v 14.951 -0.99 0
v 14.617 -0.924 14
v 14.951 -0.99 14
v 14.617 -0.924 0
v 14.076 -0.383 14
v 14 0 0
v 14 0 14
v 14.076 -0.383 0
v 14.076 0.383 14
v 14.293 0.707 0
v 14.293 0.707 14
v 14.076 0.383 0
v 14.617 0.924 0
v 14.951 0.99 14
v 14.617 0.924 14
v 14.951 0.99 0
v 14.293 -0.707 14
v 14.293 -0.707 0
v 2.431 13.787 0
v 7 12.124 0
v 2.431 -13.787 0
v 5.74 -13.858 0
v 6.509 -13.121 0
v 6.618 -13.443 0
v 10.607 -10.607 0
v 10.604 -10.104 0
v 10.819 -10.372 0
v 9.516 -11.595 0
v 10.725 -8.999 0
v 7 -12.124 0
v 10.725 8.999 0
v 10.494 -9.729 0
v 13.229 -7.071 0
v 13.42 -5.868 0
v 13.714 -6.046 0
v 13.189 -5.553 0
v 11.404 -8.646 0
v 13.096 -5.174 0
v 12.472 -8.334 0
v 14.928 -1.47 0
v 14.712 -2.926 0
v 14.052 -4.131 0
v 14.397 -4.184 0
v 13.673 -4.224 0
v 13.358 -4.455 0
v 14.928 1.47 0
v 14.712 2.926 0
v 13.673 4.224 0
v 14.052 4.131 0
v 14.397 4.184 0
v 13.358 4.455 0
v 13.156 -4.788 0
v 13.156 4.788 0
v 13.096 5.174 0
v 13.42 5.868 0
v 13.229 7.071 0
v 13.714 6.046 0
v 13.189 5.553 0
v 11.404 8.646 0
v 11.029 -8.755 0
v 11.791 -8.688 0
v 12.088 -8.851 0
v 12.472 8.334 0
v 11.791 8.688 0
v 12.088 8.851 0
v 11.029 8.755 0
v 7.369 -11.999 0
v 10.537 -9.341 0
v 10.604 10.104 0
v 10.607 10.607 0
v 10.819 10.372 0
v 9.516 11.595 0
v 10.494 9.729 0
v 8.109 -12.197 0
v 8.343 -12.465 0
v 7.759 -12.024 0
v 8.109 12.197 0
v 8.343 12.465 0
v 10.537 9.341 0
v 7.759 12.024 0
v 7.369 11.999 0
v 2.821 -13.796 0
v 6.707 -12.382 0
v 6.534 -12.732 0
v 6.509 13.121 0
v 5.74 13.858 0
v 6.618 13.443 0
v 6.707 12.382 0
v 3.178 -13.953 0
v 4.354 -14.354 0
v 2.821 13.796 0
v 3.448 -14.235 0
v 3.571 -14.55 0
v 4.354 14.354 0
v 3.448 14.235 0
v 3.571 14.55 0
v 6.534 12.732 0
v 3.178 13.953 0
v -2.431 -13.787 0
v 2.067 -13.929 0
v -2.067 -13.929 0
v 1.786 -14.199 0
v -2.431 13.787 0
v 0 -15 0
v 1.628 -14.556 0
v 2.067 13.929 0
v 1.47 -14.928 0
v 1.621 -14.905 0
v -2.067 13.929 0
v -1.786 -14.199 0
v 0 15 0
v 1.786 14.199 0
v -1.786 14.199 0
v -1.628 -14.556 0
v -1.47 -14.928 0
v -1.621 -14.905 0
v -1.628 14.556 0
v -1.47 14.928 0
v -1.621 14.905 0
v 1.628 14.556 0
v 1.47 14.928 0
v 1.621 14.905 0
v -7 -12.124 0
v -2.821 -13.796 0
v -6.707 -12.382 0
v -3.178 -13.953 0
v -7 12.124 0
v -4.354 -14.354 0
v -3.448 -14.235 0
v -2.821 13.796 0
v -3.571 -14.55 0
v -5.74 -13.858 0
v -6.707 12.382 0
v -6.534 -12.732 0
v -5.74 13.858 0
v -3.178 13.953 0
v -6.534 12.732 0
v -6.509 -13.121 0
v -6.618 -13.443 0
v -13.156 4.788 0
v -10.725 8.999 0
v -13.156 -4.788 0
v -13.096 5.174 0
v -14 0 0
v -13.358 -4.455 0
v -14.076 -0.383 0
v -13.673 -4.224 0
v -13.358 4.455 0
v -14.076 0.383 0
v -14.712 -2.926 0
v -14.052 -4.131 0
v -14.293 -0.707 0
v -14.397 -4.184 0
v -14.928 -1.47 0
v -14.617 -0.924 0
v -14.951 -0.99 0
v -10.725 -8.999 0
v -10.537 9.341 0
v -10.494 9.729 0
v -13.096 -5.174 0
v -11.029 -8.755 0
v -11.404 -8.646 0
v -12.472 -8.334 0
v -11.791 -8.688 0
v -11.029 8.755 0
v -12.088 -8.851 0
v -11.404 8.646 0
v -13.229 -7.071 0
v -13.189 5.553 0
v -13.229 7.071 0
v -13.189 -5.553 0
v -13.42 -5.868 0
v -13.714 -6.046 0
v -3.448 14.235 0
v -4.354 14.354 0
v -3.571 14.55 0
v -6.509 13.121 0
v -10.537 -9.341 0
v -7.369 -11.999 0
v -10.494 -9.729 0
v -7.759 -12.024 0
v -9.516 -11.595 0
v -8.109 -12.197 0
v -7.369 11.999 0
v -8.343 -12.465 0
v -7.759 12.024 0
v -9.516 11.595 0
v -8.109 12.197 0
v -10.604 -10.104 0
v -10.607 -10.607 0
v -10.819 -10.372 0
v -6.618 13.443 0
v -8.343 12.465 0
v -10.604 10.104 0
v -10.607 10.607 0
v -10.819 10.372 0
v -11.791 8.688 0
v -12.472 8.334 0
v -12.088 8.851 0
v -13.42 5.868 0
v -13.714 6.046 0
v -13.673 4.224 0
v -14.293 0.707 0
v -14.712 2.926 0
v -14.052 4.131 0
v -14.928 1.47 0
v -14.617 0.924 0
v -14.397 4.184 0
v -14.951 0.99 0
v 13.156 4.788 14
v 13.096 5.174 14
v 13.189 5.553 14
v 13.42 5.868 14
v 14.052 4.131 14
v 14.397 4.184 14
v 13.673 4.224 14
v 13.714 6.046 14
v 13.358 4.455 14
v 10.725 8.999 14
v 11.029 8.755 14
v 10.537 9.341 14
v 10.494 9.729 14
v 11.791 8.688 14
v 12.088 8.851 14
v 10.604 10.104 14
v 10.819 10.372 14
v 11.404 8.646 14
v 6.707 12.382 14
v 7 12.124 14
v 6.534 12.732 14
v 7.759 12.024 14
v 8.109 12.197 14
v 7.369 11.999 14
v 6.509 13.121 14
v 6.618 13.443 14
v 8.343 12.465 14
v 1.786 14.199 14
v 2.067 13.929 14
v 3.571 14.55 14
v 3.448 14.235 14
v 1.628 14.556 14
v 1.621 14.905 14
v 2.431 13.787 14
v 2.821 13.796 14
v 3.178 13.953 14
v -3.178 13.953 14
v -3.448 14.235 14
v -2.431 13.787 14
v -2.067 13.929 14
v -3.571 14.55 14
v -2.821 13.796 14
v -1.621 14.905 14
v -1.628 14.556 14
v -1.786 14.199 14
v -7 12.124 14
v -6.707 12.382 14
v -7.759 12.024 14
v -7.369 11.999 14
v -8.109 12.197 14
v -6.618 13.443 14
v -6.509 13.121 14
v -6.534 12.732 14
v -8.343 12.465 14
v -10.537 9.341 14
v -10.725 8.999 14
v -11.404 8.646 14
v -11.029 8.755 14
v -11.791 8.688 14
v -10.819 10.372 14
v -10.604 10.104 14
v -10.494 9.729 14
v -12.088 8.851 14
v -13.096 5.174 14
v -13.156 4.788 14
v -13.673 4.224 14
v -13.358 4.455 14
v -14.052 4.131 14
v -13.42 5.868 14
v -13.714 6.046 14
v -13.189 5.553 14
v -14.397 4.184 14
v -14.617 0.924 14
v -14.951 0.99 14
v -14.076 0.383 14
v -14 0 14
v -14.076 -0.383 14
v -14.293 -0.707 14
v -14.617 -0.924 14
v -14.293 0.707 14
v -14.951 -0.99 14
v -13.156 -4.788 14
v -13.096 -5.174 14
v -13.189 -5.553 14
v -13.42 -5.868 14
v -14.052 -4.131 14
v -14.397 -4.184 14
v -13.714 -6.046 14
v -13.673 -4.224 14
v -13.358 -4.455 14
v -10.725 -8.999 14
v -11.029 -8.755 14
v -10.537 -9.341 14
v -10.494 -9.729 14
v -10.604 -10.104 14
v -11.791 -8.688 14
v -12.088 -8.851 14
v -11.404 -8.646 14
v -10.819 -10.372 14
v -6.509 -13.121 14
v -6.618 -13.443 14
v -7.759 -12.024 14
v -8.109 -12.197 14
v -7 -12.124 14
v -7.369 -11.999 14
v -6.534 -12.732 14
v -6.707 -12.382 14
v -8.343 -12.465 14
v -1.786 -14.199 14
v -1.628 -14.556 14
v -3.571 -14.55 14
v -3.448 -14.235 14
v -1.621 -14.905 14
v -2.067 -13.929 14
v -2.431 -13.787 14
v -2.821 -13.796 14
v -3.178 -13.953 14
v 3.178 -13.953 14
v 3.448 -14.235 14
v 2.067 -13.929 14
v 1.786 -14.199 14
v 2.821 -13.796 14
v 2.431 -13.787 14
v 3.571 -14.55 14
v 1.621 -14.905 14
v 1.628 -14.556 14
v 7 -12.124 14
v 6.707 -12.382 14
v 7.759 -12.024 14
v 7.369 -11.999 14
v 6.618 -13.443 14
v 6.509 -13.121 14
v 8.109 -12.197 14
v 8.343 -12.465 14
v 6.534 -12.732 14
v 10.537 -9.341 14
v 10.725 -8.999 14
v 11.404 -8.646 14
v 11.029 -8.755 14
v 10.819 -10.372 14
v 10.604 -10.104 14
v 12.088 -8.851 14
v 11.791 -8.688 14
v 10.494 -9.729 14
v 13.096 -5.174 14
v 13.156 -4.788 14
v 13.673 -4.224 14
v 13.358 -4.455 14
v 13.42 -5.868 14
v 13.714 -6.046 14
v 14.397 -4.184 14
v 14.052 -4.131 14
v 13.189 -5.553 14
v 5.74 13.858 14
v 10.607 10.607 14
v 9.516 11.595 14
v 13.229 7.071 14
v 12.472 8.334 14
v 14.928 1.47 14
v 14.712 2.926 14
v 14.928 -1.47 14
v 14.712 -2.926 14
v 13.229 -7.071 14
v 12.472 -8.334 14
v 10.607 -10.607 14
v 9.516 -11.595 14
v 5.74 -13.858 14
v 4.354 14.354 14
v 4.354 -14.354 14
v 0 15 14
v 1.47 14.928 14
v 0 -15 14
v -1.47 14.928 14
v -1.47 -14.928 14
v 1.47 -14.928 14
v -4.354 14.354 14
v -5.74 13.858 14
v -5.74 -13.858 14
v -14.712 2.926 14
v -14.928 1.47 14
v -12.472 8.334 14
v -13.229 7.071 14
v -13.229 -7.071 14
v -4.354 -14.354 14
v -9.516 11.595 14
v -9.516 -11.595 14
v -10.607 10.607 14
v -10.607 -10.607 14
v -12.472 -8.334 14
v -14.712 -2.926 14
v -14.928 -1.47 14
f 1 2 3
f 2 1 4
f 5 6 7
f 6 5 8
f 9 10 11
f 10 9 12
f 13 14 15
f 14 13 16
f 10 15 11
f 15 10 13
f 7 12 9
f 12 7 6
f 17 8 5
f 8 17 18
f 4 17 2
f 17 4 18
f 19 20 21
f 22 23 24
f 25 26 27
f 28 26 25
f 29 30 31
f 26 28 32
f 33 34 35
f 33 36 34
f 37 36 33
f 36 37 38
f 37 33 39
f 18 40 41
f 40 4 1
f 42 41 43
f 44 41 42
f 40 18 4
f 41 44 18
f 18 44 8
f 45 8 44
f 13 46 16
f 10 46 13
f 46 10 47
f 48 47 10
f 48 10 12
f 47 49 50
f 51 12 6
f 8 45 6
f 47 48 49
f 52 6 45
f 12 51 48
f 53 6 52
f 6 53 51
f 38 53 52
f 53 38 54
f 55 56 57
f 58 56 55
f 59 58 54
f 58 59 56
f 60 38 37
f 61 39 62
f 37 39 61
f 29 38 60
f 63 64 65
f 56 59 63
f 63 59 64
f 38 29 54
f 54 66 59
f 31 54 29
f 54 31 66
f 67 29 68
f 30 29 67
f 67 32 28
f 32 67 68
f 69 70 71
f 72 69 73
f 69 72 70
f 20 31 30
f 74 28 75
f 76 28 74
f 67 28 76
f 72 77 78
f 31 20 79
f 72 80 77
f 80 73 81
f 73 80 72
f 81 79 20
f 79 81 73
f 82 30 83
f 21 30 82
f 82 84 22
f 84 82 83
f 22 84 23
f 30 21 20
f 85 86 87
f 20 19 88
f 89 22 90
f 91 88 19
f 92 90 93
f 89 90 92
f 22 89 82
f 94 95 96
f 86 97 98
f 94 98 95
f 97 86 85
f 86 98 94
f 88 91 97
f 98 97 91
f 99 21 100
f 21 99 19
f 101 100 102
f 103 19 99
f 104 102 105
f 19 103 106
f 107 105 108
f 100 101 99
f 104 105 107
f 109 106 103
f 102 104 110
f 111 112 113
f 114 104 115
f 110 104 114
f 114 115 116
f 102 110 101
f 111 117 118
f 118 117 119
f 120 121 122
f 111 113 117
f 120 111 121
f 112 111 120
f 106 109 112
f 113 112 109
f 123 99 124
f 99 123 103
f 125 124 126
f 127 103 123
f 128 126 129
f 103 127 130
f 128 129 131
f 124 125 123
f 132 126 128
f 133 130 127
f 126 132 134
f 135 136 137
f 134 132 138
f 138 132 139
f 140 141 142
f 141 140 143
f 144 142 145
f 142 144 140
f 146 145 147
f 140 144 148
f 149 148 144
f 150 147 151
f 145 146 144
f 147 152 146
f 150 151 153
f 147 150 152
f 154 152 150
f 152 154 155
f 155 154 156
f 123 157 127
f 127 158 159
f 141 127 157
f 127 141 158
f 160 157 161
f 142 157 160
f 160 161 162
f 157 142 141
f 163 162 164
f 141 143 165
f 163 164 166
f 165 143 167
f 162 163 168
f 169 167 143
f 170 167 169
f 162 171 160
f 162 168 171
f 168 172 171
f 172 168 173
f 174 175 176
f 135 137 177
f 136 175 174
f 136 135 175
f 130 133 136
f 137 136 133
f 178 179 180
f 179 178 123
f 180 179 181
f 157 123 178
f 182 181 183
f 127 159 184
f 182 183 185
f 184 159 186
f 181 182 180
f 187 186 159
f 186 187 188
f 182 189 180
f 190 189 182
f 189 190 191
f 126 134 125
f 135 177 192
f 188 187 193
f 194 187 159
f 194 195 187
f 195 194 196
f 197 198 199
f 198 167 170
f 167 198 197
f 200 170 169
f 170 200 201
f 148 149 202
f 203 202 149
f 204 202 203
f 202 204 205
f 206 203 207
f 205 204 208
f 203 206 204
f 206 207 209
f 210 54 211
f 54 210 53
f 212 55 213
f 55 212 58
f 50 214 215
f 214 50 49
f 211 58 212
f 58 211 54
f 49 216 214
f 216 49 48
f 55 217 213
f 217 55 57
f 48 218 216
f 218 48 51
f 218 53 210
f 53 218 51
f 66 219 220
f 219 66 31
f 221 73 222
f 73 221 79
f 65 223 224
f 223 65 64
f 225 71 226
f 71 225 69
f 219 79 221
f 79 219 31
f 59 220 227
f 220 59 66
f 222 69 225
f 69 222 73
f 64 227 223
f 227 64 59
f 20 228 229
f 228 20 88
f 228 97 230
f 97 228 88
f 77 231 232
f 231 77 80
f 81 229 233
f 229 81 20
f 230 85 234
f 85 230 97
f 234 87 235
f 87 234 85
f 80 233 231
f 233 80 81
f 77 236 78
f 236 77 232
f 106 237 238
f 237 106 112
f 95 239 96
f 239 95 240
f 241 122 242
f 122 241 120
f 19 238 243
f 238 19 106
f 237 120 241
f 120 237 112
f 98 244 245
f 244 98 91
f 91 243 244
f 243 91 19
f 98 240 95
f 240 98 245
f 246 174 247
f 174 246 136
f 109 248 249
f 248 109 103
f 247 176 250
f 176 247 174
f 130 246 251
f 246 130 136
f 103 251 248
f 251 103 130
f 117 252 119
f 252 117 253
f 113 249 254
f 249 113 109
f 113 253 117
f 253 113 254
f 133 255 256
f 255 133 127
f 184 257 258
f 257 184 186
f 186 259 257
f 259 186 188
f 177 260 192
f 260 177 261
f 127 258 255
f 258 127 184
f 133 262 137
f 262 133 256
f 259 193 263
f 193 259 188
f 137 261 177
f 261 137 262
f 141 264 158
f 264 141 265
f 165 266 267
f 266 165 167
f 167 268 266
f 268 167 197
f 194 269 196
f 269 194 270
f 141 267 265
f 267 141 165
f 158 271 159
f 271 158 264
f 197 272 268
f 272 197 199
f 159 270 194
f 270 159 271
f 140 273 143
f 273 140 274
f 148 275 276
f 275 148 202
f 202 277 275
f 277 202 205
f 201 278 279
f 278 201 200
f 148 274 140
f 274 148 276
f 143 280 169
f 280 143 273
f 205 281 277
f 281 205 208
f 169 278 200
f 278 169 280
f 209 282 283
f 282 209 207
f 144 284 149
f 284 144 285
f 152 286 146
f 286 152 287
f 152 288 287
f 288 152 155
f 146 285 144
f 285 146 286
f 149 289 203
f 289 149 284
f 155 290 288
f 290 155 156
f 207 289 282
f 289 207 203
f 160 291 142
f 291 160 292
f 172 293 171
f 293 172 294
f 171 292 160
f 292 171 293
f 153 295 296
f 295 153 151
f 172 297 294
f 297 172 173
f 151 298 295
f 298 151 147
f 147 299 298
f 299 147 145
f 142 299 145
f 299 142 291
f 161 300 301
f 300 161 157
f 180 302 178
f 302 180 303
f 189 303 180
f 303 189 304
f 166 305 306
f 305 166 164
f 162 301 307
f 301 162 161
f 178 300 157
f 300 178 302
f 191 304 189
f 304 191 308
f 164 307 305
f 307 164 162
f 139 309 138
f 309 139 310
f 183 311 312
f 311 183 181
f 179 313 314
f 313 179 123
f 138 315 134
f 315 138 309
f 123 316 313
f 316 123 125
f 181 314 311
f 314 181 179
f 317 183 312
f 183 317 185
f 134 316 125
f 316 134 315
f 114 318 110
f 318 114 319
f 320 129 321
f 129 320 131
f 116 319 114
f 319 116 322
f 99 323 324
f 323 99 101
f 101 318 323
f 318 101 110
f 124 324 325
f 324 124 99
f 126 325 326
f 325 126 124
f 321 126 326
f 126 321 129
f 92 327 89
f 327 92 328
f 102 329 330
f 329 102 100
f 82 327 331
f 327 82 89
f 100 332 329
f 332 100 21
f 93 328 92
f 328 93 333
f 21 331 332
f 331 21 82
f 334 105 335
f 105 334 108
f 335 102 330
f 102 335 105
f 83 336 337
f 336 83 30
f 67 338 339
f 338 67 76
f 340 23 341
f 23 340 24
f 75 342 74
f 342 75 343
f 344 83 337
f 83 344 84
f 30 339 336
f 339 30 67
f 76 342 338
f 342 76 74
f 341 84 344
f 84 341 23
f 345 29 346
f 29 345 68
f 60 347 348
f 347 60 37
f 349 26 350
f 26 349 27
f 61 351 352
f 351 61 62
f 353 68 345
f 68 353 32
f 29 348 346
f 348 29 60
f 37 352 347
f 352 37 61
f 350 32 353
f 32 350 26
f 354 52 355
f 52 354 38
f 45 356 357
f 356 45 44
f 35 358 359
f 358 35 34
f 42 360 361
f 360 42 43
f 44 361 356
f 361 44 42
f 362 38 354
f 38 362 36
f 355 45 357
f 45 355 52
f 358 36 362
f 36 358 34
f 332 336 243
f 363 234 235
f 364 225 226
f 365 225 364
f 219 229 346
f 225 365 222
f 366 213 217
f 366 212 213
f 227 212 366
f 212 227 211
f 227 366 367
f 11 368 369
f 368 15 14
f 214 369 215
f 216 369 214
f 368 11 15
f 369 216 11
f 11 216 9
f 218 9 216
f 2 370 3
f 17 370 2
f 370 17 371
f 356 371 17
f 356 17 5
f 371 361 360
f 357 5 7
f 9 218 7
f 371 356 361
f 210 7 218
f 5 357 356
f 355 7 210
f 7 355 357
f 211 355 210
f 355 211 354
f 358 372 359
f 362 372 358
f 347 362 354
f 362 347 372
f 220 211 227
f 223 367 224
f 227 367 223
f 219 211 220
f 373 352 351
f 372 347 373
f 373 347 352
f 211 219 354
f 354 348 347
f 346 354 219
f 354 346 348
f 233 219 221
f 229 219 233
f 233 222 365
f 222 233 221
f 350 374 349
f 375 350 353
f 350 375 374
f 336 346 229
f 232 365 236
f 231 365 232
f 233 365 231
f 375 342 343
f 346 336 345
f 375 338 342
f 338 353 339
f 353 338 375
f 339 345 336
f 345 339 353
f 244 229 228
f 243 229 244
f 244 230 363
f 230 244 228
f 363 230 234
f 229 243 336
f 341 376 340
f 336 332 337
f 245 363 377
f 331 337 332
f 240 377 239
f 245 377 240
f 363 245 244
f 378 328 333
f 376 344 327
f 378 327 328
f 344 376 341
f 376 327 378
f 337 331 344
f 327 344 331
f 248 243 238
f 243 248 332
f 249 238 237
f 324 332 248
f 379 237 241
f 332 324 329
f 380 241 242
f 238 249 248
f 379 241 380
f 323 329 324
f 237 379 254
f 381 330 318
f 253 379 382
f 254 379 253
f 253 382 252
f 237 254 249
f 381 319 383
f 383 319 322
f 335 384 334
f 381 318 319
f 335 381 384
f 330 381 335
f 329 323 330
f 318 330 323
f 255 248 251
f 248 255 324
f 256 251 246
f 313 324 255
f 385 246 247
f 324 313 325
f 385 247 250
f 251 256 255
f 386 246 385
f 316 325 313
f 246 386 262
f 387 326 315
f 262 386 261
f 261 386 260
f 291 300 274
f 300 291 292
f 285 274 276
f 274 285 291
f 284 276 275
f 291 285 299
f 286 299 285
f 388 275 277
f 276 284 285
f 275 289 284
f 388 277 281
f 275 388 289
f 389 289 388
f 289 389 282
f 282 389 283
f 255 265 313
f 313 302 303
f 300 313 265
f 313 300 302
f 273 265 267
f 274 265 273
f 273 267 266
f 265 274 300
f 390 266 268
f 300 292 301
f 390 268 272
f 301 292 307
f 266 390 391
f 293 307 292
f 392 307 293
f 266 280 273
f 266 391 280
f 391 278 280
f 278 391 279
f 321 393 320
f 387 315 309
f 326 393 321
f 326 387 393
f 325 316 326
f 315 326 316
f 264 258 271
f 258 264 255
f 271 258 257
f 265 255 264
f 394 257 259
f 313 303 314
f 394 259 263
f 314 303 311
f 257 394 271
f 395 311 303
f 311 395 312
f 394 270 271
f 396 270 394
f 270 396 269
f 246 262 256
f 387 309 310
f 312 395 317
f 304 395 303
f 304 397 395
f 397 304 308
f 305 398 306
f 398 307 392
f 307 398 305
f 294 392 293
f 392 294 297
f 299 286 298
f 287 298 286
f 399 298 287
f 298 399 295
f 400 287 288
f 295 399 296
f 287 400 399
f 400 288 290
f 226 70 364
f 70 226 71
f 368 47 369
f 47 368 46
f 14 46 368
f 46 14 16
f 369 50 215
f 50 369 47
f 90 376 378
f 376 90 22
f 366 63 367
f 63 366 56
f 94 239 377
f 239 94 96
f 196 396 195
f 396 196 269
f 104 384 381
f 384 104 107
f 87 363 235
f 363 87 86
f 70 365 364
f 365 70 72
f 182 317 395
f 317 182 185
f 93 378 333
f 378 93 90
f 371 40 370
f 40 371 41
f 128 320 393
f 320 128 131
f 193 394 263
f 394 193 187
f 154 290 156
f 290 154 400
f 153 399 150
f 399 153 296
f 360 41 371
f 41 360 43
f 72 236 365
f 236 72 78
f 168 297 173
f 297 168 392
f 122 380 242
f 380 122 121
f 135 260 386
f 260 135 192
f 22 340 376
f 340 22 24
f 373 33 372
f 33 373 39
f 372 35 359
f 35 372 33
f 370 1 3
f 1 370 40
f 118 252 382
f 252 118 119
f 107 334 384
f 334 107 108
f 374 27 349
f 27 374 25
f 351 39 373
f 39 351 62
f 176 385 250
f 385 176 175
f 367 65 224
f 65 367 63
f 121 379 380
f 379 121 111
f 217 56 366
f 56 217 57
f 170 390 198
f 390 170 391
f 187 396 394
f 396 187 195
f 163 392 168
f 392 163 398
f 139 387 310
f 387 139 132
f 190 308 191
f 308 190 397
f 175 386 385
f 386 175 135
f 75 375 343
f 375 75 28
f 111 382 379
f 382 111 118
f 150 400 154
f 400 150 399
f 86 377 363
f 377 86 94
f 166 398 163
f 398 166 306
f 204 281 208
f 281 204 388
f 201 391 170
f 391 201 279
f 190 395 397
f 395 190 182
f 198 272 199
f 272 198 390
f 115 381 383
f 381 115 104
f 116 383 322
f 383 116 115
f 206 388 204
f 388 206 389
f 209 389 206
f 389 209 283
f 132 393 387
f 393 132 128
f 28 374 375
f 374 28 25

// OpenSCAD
// Replacement knob for a hotplate stirrer - a cylinder with a D-shaped blind bore and a
// pointer groove, and with a ring of grip grooves around the outside. NOVEL general part.
//

bottom   = 30;
height   = 15;
shaft_d  = 6.2;
flat     = 4.7;
grooves  = 18;
pointer  = 1.5;

$fn = 64;

difference() {
    cylinder(h = height, d = bottom);
    translate([0, 0, -1]) intersection() {
        cylinder(h = height + 2, d = shaft_d);
        translate([0, -bottom / 2, 0]) rotate([0, 90, 0]) cylinder(h = bottom, d = flat);
    }
    for (i = [0 : grooves - 1])
        rotate([0, 0, i * 360 / grooves]) translate([bottom / 2, 0, 0]) cylinder(h = height, d = 2, $fn = 16);
    translate([0, 0, height - 1]) cylinder(h = 2, d = bottom);
    translate([0, 0, height - 1]) difference() {
        cylinder(h = 2, d = bottom);
        translate([0, -bottom / 2, 0]) rotate([0, 90, 0]) cylinder(h = bottom, d = flat);
    }
    translate([0, -bottom / 2, height - 1]) rotate([0, 0, -90]) linear_extrude(bottom) circle(d = pointer);
}
